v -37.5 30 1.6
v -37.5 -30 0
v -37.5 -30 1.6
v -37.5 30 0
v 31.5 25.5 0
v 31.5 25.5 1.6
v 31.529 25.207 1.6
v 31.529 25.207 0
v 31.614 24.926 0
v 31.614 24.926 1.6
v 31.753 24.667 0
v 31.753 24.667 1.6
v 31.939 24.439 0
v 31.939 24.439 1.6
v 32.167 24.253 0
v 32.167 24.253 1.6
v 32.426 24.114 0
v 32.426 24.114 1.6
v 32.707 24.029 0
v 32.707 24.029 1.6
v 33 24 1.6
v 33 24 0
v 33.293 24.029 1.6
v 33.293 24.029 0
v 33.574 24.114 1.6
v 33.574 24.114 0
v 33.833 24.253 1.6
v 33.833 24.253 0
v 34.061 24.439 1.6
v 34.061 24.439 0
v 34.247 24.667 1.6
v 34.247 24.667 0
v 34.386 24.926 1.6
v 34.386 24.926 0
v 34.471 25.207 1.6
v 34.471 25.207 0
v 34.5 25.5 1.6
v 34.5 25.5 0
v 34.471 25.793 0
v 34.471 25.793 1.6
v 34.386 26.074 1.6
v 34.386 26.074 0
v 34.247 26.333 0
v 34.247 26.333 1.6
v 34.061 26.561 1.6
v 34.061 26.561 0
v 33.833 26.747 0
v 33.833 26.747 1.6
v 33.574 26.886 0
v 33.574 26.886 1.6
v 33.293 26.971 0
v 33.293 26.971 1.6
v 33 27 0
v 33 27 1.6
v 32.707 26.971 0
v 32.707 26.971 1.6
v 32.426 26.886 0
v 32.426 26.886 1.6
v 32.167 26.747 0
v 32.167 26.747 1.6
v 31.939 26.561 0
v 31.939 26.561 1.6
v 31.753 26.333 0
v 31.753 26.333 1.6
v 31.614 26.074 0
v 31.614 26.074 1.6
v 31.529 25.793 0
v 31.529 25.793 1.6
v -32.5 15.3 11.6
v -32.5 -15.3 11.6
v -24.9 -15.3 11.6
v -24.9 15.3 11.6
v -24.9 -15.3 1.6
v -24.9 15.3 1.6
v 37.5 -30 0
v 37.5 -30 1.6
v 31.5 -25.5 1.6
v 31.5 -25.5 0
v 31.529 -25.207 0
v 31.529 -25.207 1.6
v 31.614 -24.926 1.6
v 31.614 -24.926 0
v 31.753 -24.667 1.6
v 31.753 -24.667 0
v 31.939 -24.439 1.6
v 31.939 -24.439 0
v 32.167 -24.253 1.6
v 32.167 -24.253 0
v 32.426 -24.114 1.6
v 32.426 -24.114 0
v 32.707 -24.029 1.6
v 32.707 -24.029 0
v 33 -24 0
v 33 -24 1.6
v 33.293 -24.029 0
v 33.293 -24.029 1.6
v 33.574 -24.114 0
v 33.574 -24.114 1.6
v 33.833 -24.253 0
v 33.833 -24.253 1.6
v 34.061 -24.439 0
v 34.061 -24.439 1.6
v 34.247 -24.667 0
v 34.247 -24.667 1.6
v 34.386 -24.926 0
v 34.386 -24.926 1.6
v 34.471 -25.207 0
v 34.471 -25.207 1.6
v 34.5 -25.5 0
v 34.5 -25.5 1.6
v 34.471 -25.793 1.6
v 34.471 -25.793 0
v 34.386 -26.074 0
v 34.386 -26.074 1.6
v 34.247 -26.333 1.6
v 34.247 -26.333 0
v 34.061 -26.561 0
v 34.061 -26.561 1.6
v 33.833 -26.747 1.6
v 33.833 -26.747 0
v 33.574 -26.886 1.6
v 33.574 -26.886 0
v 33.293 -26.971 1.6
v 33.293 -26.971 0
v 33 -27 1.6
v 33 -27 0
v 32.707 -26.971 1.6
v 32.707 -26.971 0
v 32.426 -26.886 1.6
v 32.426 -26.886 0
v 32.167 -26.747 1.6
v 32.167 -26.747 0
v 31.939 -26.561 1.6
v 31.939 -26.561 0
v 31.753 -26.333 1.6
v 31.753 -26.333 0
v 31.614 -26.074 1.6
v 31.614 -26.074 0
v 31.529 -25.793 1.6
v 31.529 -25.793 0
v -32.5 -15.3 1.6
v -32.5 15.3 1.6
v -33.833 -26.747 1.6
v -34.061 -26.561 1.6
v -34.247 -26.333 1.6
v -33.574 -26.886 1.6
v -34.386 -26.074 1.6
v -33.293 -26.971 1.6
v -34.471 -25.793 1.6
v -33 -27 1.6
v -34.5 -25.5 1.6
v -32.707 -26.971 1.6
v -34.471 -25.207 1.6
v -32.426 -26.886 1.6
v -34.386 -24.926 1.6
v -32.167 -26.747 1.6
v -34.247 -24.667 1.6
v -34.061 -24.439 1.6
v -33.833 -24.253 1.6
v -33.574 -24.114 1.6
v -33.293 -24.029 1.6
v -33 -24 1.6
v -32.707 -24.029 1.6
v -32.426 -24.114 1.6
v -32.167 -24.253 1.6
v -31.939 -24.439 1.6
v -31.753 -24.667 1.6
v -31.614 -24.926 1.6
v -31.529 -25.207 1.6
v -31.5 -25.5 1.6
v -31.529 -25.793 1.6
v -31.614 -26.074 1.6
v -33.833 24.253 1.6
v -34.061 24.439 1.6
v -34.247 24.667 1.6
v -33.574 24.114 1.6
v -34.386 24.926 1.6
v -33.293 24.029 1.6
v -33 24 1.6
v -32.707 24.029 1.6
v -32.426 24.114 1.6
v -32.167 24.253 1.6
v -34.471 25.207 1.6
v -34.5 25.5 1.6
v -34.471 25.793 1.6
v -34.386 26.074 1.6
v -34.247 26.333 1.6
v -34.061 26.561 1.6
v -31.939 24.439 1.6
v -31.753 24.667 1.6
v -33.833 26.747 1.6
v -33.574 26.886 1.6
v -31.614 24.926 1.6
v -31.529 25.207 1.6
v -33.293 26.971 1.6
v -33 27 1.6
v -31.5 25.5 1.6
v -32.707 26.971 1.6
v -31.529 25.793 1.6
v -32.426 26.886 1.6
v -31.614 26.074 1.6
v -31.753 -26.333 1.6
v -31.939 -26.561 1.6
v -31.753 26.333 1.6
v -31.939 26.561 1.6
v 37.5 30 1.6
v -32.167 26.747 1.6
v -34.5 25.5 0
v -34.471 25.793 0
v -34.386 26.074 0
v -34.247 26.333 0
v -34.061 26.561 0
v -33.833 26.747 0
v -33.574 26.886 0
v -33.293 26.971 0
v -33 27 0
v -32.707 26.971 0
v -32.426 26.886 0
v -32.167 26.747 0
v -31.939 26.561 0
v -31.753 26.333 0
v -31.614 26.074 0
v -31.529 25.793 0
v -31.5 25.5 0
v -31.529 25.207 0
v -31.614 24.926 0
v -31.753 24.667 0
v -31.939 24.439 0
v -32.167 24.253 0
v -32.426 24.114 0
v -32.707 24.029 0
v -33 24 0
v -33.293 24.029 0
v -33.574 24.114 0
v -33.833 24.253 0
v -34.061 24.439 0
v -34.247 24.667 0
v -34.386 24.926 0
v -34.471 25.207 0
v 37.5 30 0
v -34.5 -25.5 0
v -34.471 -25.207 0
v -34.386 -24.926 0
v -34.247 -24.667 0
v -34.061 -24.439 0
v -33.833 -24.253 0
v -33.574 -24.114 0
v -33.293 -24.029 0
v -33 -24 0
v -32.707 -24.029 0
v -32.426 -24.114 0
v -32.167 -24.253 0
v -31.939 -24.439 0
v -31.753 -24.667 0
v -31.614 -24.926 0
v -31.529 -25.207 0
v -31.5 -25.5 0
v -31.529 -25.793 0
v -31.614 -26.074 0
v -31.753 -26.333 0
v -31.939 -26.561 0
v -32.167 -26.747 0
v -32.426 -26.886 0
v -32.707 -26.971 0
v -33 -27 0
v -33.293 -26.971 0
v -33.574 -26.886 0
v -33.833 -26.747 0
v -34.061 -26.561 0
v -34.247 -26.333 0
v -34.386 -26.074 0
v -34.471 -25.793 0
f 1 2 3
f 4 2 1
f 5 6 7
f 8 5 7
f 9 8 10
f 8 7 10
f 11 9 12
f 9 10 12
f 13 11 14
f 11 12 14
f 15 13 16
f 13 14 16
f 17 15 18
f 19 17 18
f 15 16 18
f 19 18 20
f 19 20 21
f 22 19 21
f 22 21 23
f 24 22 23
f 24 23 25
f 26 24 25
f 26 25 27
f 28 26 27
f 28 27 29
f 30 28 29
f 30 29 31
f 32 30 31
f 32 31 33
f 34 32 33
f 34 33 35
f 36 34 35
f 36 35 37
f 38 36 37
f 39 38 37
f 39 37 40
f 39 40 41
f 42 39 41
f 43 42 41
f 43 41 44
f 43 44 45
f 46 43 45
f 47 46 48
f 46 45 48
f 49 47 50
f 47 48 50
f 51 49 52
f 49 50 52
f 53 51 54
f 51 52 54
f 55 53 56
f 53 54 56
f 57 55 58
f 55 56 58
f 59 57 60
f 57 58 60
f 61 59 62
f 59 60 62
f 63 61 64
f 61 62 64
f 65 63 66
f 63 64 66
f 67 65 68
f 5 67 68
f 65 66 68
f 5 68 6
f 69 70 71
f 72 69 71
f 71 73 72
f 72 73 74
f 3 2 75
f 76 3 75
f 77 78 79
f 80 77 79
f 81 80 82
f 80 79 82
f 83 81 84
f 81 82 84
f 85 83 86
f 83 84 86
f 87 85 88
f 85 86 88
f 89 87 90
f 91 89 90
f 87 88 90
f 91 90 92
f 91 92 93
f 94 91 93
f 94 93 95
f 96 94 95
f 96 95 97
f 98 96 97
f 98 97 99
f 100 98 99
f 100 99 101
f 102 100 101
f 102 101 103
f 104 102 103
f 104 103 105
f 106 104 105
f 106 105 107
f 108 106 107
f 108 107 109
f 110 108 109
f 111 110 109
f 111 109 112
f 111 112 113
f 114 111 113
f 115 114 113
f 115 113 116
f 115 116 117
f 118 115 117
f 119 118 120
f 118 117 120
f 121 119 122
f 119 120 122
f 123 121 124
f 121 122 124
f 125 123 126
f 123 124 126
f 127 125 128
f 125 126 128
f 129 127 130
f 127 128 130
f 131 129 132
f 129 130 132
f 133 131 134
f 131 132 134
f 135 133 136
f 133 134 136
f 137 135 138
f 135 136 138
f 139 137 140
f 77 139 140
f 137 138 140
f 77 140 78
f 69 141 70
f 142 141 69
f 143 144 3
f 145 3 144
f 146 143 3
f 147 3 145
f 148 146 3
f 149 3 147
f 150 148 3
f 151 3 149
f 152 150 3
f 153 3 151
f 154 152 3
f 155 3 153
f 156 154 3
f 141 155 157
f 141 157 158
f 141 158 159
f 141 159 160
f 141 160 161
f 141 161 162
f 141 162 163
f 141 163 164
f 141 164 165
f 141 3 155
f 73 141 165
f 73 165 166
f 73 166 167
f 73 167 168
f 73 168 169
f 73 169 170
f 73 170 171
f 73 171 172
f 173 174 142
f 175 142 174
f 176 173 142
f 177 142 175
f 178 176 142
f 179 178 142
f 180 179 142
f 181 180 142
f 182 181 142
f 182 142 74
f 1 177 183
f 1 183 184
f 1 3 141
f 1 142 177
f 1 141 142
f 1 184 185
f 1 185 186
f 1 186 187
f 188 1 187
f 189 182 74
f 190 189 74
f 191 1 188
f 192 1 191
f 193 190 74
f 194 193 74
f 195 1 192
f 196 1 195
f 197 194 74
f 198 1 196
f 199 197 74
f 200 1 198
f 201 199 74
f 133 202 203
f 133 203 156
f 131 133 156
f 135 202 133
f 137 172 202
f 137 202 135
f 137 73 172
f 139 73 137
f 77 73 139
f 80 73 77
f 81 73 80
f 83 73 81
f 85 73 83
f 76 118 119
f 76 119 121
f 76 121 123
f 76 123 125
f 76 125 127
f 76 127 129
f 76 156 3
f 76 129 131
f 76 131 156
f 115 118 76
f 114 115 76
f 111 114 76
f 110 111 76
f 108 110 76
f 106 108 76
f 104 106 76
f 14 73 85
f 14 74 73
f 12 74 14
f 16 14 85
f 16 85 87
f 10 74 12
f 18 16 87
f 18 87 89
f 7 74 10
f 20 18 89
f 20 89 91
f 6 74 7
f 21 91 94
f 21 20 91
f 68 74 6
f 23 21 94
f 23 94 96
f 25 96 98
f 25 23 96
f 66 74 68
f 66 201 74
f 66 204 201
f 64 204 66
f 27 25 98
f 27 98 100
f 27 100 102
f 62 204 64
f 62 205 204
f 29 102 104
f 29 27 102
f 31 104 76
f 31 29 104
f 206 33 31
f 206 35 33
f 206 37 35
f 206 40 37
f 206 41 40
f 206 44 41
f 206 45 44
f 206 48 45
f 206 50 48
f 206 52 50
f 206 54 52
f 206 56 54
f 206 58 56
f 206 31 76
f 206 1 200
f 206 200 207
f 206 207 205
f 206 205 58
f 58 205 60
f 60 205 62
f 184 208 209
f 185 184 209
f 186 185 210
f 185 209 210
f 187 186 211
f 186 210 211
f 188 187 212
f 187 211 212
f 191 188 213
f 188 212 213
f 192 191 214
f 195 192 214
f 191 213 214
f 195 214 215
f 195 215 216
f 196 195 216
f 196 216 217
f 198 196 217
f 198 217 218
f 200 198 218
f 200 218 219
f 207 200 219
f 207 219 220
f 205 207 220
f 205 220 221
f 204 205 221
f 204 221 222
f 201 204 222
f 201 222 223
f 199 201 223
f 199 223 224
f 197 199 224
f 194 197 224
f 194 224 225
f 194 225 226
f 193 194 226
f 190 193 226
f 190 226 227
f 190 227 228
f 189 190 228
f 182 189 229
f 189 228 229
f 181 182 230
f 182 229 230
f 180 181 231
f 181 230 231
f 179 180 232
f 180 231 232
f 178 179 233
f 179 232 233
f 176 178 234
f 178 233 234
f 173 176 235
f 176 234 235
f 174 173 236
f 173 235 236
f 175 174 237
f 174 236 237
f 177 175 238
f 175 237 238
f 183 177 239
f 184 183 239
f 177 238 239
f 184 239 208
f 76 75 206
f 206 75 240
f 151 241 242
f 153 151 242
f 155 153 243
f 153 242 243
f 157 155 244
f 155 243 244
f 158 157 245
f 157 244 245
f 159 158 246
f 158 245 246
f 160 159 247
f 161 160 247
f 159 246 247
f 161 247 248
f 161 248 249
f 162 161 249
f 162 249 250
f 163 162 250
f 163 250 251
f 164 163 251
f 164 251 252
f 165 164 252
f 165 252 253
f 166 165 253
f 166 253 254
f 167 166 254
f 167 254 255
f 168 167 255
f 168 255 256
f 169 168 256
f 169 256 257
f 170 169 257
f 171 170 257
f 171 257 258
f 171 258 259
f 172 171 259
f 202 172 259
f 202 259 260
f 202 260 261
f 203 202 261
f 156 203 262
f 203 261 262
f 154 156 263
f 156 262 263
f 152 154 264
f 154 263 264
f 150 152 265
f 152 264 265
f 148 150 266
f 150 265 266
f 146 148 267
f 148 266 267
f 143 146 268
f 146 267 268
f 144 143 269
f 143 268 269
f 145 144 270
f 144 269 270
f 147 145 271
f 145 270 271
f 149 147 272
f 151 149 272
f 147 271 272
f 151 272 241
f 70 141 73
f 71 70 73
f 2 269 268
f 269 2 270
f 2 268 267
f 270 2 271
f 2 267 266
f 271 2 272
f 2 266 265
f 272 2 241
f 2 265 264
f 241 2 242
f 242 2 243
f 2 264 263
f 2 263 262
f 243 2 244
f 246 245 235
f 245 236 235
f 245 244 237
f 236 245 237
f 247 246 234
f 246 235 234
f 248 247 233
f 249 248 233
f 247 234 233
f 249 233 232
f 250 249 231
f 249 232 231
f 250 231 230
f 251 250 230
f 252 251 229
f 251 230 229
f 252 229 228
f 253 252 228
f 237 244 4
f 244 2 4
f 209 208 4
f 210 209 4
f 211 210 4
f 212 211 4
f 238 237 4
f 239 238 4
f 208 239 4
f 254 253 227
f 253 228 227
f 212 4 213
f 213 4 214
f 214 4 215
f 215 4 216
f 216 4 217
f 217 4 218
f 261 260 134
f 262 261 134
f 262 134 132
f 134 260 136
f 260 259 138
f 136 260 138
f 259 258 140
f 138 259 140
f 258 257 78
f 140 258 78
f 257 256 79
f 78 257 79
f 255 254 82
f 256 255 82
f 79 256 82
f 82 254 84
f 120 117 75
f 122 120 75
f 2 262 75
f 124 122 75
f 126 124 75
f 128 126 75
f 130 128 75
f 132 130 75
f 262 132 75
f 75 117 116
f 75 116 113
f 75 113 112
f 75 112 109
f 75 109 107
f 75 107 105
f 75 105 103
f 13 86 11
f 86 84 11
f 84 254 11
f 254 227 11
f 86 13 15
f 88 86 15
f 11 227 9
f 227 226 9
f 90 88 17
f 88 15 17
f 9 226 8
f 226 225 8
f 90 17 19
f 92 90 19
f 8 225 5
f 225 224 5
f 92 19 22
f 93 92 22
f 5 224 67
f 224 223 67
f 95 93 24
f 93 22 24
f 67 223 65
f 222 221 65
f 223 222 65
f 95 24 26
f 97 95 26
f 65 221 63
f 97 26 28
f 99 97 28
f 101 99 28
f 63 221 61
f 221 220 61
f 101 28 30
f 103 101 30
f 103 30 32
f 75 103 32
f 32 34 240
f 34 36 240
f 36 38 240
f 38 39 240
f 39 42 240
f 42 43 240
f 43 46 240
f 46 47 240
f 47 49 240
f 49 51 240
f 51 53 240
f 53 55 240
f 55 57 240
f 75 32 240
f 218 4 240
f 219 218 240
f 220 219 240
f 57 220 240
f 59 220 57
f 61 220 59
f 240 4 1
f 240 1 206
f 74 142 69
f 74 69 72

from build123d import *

# Parameters (mm, degrees)
F0_W     = 75
F0_H     = 60
F1_DEPTH = 1.6
F2_W     = 7.6
F2_H     = 30.6
F3_DEPTH = 10
F5_D     = 3
F7_D     = 3
F9_D     = 3
F11_D    = 3


with BuildPart() as f1:
    # F0 (on Top) → F1 (new body)
    with BuildSketch(Plane.XY):
        Rectangle(F0_W, F0_H)
    extrude(amount=F1_DEPTH)

    # F2 (on face) → F3 (join)
    with BuildSketch(Plane.XY.offset(1.6)):
        with Locations((-28.7, 2.328e-07)):
            Rectangle(F2_W, F2_H)
    extrude(amount=F3_DEPTH)

    # F5 (through all)
    with Locations(Plane.XY.offset(1.6)):
        with Locations((-33, 25.5)):
            Hole(F5_D / 2)

    # F7 (through all)
    with Locations(Plane(origin=(0, 0, 0), x_dir=(1, 0, 0), z_dir=(0, 0, -1))):
        with Locations((33, -25.5)):
            Hole(F7_D / 2)

    # F9 (through all)
    with Locations(Plane.XY.offset(1.6)):
        with Locations((33, -25.5)):
            Hole(F9_D / 2)

    # F11 (through all)
    with Locations(Plane.XY.offset(1.6)):
        with Locations((-33, -25.5)):
            Hole(F11_D / 2)


with BuildPart() as f12_1:
    # F12: copy of F1
    add(f1.part)


solid = f1.part
